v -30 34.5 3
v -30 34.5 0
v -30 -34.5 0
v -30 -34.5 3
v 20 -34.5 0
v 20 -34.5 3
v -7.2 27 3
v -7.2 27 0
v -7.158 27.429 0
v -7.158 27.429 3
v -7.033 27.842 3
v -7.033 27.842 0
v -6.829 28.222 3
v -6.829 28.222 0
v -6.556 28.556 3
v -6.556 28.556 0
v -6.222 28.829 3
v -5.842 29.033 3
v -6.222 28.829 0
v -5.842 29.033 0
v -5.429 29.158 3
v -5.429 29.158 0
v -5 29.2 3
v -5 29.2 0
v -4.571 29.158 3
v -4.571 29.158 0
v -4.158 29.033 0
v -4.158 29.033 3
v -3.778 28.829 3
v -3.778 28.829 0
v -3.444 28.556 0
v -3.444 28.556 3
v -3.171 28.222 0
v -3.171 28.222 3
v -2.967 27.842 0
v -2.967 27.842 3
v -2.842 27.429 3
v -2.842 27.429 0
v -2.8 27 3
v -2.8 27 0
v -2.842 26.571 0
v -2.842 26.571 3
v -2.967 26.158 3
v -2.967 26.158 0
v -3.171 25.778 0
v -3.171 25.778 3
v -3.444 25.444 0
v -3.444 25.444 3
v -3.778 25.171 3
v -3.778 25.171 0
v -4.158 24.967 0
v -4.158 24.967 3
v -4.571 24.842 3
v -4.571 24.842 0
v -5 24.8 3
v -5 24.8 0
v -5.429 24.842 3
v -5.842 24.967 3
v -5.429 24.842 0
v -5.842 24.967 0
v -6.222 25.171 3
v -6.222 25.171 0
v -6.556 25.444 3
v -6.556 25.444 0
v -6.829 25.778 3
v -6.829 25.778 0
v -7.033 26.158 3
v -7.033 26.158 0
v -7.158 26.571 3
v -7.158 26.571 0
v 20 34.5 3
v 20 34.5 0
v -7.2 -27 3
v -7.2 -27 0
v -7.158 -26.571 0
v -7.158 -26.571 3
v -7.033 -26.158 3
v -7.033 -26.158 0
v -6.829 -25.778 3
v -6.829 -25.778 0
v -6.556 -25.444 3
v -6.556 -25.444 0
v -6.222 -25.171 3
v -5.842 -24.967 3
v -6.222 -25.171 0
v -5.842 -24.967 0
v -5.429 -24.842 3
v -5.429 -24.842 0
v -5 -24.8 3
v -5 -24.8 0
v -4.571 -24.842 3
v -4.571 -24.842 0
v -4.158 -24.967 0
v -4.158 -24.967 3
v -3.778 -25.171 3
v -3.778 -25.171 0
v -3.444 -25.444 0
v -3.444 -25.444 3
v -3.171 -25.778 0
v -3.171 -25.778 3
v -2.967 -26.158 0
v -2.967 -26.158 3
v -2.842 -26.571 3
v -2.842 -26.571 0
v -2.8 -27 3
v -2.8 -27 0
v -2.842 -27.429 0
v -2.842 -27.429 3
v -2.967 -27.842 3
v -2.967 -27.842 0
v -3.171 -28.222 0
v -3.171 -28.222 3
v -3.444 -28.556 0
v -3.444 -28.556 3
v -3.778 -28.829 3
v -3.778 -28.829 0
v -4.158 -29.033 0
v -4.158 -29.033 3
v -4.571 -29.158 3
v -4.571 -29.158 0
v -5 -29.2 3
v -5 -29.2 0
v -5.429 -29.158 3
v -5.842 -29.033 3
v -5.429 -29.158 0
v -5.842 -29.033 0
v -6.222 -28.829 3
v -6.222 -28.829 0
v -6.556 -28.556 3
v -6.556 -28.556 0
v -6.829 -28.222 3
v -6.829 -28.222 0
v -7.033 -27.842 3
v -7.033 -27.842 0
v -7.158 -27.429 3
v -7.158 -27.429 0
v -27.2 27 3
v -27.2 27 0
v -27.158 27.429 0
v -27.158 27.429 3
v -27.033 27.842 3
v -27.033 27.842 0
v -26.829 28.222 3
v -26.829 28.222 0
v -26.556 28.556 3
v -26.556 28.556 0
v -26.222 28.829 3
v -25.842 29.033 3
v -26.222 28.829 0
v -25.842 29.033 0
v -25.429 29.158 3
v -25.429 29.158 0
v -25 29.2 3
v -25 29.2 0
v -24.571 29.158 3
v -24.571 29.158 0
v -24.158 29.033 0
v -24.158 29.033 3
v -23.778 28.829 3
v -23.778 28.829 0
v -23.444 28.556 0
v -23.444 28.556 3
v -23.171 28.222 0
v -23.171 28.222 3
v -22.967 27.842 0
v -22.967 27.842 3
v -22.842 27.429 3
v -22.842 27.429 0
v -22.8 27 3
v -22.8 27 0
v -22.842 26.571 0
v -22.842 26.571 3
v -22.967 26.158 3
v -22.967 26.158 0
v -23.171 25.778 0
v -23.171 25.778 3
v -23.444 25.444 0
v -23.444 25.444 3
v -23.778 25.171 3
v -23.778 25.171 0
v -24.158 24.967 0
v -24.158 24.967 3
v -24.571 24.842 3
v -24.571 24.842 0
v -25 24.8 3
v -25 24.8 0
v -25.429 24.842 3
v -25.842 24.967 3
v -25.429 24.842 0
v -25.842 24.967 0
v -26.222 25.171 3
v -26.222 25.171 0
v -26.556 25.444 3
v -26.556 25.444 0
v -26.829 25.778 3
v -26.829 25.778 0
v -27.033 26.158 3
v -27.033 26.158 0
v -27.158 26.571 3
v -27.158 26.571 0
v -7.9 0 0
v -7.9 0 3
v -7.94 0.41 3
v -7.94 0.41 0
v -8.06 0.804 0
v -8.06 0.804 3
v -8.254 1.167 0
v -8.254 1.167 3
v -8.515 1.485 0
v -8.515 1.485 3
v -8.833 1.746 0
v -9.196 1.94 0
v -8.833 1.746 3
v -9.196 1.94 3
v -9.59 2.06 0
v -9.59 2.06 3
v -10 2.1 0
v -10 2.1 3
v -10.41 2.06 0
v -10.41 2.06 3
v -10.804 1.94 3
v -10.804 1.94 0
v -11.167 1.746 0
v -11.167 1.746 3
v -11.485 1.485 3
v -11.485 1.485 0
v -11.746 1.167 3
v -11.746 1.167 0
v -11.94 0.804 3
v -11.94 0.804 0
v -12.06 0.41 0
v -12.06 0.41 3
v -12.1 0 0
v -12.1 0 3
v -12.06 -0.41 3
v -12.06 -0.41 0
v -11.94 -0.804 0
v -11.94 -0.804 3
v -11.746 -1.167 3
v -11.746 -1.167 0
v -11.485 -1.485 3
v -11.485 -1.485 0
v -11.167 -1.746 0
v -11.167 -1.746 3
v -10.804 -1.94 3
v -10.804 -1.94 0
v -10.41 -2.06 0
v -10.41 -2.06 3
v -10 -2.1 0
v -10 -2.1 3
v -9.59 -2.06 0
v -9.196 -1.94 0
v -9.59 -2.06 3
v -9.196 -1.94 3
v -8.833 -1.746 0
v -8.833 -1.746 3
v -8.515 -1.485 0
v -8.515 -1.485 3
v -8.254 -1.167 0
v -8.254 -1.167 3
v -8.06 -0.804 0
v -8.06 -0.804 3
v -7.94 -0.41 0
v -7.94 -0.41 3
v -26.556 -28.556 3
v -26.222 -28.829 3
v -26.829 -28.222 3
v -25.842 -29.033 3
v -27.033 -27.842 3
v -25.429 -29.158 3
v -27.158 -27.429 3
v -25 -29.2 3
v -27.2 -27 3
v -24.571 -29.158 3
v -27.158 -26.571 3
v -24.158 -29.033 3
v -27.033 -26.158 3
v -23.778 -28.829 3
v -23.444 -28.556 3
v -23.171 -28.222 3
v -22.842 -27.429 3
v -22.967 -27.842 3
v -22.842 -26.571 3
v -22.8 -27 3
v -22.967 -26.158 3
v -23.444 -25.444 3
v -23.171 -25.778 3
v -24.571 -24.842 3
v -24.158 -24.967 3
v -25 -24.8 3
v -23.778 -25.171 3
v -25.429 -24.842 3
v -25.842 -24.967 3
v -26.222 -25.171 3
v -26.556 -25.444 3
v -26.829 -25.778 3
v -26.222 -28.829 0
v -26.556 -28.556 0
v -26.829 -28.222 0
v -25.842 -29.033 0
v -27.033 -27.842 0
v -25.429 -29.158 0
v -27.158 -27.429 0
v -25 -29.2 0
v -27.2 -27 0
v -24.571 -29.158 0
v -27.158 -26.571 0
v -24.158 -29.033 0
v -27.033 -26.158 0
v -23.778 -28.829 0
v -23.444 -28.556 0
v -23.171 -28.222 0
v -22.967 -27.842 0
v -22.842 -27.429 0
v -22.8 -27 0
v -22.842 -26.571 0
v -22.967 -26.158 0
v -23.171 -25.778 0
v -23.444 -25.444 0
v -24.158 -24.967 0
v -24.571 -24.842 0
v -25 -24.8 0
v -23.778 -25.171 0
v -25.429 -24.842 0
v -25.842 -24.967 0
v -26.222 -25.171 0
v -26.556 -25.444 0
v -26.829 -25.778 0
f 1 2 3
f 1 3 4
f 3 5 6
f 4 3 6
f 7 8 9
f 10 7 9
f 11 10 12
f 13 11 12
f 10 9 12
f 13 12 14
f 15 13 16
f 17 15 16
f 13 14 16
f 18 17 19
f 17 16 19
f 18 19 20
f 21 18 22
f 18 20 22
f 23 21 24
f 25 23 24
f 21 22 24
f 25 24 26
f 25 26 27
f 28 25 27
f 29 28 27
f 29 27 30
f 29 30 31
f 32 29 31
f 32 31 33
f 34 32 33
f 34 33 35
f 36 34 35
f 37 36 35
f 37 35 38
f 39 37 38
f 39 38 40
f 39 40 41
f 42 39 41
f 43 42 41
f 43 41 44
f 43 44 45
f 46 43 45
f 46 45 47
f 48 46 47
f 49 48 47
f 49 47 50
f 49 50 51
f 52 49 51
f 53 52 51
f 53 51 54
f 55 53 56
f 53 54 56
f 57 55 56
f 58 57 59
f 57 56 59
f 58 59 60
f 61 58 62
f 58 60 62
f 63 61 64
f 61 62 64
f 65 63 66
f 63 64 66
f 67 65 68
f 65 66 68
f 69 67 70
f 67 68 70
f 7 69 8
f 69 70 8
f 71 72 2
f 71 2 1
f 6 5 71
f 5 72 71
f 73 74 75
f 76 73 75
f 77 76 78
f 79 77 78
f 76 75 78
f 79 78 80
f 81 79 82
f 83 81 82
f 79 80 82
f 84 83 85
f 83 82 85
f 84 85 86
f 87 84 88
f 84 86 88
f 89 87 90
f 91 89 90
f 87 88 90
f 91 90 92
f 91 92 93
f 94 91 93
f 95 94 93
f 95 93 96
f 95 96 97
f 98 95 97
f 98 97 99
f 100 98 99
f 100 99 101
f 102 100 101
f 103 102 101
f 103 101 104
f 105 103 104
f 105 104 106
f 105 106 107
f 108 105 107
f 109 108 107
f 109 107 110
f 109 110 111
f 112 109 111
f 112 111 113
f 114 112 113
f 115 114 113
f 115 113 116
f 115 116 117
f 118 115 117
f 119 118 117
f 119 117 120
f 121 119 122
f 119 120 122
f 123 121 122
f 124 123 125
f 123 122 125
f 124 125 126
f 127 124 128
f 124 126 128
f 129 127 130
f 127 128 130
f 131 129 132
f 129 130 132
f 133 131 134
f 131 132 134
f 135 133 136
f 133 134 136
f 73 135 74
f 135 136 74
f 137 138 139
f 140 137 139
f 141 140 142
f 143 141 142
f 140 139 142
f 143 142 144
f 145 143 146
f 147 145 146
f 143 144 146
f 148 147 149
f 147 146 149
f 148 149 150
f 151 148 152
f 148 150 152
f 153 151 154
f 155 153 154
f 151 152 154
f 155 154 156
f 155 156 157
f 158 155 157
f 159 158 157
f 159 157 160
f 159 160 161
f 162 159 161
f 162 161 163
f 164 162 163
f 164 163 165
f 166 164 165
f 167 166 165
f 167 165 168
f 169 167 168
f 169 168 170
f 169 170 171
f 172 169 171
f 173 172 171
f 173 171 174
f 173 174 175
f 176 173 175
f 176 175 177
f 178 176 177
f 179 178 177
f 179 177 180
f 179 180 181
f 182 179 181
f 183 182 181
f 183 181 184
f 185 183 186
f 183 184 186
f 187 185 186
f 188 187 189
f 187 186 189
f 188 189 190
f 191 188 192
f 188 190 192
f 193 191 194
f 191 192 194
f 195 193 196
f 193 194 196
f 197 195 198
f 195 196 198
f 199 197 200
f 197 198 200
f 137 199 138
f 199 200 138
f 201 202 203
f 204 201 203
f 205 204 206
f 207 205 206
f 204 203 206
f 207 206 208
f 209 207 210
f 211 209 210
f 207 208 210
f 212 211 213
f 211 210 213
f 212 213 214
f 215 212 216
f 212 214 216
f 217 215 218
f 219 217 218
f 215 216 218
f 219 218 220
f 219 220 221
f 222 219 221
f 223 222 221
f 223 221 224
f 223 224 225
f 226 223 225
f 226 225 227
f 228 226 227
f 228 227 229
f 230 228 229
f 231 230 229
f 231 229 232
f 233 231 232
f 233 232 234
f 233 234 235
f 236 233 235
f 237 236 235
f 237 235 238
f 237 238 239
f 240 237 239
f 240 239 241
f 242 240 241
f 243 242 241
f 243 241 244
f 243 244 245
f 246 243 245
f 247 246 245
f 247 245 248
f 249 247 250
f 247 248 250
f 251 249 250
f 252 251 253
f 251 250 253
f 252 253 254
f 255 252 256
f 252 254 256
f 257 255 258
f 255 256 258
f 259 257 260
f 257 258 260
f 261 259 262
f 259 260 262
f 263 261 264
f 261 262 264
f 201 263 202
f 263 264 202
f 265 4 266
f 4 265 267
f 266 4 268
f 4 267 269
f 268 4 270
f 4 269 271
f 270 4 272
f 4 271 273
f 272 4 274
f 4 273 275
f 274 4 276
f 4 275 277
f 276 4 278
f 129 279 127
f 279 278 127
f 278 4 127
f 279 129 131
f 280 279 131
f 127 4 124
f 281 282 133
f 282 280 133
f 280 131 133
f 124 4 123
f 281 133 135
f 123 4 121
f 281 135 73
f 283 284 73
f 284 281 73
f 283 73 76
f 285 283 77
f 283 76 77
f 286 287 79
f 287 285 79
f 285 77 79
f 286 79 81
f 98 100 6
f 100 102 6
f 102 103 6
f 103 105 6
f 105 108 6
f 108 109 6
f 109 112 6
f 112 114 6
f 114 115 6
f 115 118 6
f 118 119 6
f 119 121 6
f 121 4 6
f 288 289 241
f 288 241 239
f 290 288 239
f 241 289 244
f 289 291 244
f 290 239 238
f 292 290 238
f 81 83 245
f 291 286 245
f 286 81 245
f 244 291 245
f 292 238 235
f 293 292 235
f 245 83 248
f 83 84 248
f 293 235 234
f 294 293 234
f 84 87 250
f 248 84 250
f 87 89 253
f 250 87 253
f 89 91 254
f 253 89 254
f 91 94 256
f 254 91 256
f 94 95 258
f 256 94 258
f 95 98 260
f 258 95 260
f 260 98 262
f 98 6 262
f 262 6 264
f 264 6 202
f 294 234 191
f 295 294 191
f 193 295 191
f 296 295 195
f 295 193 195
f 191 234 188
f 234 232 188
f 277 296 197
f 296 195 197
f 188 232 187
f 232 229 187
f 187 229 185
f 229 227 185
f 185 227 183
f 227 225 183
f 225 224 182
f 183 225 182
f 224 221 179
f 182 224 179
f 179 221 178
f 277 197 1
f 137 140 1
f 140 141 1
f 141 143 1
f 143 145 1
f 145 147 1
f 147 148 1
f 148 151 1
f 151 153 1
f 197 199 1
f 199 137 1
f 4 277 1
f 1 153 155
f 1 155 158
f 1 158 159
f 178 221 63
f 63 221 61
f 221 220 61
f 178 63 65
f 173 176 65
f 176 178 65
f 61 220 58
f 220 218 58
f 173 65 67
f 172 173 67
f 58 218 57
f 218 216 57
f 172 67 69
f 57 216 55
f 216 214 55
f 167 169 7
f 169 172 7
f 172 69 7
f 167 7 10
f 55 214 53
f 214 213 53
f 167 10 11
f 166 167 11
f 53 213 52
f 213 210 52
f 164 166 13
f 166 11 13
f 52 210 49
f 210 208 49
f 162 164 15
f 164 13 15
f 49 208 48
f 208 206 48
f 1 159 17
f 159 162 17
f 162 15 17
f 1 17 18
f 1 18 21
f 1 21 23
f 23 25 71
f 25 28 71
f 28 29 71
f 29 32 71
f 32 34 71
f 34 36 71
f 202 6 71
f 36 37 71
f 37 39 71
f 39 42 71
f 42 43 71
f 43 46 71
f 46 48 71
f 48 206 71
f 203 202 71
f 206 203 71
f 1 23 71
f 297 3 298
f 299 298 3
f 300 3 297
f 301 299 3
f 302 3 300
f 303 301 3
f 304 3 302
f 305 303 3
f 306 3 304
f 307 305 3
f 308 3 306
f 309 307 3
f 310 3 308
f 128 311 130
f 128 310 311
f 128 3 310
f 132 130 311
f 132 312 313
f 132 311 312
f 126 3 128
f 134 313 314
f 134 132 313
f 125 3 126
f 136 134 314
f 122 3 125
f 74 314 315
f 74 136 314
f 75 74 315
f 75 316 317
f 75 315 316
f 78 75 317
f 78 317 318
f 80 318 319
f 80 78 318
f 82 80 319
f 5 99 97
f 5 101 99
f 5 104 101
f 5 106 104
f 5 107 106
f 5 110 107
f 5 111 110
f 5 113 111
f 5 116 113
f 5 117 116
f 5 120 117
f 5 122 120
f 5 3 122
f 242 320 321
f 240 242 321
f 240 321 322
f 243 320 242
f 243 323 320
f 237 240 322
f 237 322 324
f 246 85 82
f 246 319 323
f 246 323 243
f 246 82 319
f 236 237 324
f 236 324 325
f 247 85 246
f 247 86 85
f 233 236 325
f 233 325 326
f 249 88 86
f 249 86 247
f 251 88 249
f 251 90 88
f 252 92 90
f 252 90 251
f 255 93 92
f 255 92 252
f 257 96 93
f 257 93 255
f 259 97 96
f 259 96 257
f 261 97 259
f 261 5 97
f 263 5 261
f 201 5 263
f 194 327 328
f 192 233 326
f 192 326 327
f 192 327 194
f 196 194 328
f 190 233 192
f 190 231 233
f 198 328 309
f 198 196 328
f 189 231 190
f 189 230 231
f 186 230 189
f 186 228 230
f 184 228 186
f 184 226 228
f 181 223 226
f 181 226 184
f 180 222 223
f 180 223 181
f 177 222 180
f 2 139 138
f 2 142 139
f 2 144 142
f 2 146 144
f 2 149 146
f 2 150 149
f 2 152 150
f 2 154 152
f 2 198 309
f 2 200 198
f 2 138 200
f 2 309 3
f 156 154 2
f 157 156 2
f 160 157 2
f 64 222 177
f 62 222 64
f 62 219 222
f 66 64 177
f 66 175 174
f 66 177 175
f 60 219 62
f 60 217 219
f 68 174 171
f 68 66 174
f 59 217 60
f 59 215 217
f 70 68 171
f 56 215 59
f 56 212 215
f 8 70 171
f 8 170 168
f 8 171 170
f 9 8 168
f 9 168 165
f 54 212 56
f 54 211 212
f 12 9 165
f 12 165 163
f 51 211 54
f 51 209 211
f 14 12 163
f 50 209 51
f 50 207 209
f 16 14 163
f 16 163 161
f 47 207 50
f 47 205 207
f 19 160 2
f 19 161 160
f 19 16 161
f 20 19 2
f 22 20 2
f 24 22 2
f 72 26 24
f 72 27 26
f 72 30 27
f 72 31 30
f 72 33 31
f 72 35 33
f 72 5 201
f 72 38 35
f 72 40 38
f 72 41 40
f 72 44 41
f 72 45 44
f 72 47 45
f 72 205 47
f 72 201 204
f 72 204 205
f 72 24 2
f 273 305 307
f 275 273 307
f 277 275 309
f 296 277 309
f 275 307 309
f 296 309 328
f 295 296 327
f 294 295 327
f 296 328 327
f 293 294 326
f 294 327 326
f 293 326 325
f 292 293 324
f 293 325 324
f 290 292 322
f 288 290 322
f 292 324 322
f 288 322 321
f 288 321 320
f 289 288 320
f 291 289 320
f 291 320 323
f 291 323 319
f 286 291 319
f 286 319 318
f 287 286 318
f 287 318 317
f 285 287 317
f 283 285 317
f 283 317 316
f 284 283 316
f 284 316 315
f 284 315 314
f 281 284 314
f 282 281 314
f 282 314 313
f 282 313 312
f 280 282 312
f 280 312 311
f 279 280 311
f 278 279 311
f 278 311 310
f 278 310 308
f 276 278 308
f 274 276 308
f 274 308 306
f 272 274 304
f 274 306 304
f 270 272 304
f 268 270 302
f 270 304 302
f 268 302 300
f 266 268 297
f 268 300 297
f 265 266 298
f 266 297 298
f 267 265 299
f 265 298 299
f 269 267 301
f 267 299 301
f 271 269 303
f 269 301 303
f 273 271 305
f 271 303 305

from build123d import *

# Parameters (mm, degrees)
SKETCH_1_W          = 40
SKETCH_1_H          = 29
EXTRUDE_1_DEPTH     = 3
SKETCH_3_W          = 40
SKETCH_3_H          = 3
EXTRUDE_2_DEPTH     = 3
SKETCH_4_W          = 40
SKETCH_4_H          = 3
EXTRUDE_3_DEPTH     = 3
SKETCH_5_W          = 40
SKETCH_5_H          = 3
EXTRUDE_4_DEPTH     = 7
SKETCH_6_W          = 40
SKETCH_6_H          = 3
EXTRUDE_5_DEPTH     = 7
SKETCH_7_W          = 40
SKETCH_7_H          = 3
EXTRUDE_6_DEPTH     = 10
SKETCH_8_W          = 40
SKETCH_8_H          = 3
EXTRUDE_7_DEPTH     = 10
SKETCH_12_W         = 3
SKETCH_12_H         = 69
EXTRUDE_9_DEPTH     = 30
SKETCH_15_R         = 2.1
CUT_EXTRUDE_4_DEPTH = 10
SKETCH_16_W         = 3
SKETCH_16_H         = 69
CUT_EXTRUDE_5_DEPTH = 20
SKETCH_17_R         = 2.2
CUT_EXTRUDE_6_DEPTH = 10


with BuildPart() as part:
    # ｽｹｯﾁ1 → ﾎﾞｽ - 押し出し1 (new body)
    with BuildSketch(Plane.XY):
        Rectangle(SKETCH_1_W, SKETCH_1_H)
    extrude(amount=EXTRUDE_1_DEPTH)

    # ｽｹｯﾁ3 → ﾎﾞｽ - 押し出し2 (add)
    with BuildSketch(Plane(origin=(0, -14.5, 0), x_dir=(-1, 0, 0), z_dir=(0, -1, 0))):
        with Locations((0, -1.5)):
            Rectangle(SKETCH_3_W, SKETCH_3_H)
    extrude(amount=EXTRUDE_2_DEPTH)

    # ｽｹｯﾁ4 → ﾎﾞｽ - 押し出し3 (add)
    with BuildSketch(Plane(origin=(0, 14.5, 0), x_dir=(1, 0, 0), z_dir=(0, 1, 0))):
        with Locations((0, -1.5)):
            Rectangle(SKETCH_4_W, SKETCH_4_H)
    extrude(amount=EXTRUDE_3_DEPTH)

    # ｽｹｯﾁ5 → ﾎﾞｽ - 押し出し4 (add)
    with BuildSketch(Plane.XZ.offset(17.5)):
        with Locations((0, 1.5)):
            Rectangle(SKETCH_5_W, SKETCH_5_H)
    extrude(amount=EXTRUDE_4_DEPTH)

    # ｽｹｯﾁ6 → ﾎﾞｽ - 押し出し5 (add)
    with BuildSketch(Plane(origin=(0, 17.5, 0), x_dir=(1, 0, 0), z_dir=(0, 1, 0))):
        with Locations((0, -1.5)):
            Rectangle(SKETCH_6_W, SKETCH_6_H)
    extrude(amount=EXTRUDE_5_DEPTH)

    # ｽｹｯﾁ7 → ﾎﾞｽ - 押し出し6 (add)
    with BuildSketch(Plane(origin=(0, 24.5, 0), x_dir=(1, 0, 0), z_dir=(0, 1, 0))):
        with Locations((0, -1.5)):
            Rectangle(SKETCH_7_W, SKETCH_7_H)
    extrude(amount=EXTRUDE_6_DEPTH)

    # ｽｹｯﾁ8 → ﾎﾞｽ - 押し出し7 (add)
    with BuildSketch(Plane.XZ.offset(24.5)):
        with Locations((0, 1.5)):
            Rectangle(SKETCH_8_W, SKETCH_8_H)
    extrude(amount=EXTRUDE_7_DEPTH)

    # ｽｹｯﾁ12 → ﾎﾞｽ - 押し出し9 (add)
    with BuildSketch(Plane.ZY.offset(20)):
        with Locations((1.5, 0)):
            Rectangle(SKETCH_12_W, SKETCH_12_H)
    extrude(amount=EXTRUDE_9_DEPTH)

    # ｽｹｯﾁ15 → ｶｯﾄ - 押し出し4 (cut)
    with BuildSketch(Plane.XY.offset(3)):
        with Locations((-10, 0)):
            Circle(SKETCH_15_R)
    extrude(amount=-CUT_EXTRUDE_4_DEPTH, mode=Mode.SUBTRACT)

    # ｽｹｯﾁ16 → ｶｯﾄ - 押し出し5 (cut)
    with BuildSketch(Plane.ZY.offset(50)):
        with Locations((1.5, 0)):
            Rectangle(SKETCH_16_W, SKETCH_16_H)
    extrude(amount=-CUT_EXTRUDE_5_DEPTH, mode=Mode.SUBTRACT)

    # ｽｹｯﾁ17 → ｶｯﾄ - 押し出し6 (cut)
    with BuildSketch(Plane(origin=(0, 0, 0), x_dir=(-1, 0, 0), z_dir=(0, 0, -1))):
        with Locations((5, 27)):
            Circle(SKETCH_17_R)
        with Locations((25, 27)):
            Circle(SKETCH_17_R)
        with Locations((5, -27)):
            Circle(SKETCH_17_R)
        with Locations((25, -27)):
            Circle(SKETCH_17_R)
    extrude(amount=-CUT_EXTRUDE_6_DEPTH, mode=Mode.SUBTRACT)


solid = part.part
